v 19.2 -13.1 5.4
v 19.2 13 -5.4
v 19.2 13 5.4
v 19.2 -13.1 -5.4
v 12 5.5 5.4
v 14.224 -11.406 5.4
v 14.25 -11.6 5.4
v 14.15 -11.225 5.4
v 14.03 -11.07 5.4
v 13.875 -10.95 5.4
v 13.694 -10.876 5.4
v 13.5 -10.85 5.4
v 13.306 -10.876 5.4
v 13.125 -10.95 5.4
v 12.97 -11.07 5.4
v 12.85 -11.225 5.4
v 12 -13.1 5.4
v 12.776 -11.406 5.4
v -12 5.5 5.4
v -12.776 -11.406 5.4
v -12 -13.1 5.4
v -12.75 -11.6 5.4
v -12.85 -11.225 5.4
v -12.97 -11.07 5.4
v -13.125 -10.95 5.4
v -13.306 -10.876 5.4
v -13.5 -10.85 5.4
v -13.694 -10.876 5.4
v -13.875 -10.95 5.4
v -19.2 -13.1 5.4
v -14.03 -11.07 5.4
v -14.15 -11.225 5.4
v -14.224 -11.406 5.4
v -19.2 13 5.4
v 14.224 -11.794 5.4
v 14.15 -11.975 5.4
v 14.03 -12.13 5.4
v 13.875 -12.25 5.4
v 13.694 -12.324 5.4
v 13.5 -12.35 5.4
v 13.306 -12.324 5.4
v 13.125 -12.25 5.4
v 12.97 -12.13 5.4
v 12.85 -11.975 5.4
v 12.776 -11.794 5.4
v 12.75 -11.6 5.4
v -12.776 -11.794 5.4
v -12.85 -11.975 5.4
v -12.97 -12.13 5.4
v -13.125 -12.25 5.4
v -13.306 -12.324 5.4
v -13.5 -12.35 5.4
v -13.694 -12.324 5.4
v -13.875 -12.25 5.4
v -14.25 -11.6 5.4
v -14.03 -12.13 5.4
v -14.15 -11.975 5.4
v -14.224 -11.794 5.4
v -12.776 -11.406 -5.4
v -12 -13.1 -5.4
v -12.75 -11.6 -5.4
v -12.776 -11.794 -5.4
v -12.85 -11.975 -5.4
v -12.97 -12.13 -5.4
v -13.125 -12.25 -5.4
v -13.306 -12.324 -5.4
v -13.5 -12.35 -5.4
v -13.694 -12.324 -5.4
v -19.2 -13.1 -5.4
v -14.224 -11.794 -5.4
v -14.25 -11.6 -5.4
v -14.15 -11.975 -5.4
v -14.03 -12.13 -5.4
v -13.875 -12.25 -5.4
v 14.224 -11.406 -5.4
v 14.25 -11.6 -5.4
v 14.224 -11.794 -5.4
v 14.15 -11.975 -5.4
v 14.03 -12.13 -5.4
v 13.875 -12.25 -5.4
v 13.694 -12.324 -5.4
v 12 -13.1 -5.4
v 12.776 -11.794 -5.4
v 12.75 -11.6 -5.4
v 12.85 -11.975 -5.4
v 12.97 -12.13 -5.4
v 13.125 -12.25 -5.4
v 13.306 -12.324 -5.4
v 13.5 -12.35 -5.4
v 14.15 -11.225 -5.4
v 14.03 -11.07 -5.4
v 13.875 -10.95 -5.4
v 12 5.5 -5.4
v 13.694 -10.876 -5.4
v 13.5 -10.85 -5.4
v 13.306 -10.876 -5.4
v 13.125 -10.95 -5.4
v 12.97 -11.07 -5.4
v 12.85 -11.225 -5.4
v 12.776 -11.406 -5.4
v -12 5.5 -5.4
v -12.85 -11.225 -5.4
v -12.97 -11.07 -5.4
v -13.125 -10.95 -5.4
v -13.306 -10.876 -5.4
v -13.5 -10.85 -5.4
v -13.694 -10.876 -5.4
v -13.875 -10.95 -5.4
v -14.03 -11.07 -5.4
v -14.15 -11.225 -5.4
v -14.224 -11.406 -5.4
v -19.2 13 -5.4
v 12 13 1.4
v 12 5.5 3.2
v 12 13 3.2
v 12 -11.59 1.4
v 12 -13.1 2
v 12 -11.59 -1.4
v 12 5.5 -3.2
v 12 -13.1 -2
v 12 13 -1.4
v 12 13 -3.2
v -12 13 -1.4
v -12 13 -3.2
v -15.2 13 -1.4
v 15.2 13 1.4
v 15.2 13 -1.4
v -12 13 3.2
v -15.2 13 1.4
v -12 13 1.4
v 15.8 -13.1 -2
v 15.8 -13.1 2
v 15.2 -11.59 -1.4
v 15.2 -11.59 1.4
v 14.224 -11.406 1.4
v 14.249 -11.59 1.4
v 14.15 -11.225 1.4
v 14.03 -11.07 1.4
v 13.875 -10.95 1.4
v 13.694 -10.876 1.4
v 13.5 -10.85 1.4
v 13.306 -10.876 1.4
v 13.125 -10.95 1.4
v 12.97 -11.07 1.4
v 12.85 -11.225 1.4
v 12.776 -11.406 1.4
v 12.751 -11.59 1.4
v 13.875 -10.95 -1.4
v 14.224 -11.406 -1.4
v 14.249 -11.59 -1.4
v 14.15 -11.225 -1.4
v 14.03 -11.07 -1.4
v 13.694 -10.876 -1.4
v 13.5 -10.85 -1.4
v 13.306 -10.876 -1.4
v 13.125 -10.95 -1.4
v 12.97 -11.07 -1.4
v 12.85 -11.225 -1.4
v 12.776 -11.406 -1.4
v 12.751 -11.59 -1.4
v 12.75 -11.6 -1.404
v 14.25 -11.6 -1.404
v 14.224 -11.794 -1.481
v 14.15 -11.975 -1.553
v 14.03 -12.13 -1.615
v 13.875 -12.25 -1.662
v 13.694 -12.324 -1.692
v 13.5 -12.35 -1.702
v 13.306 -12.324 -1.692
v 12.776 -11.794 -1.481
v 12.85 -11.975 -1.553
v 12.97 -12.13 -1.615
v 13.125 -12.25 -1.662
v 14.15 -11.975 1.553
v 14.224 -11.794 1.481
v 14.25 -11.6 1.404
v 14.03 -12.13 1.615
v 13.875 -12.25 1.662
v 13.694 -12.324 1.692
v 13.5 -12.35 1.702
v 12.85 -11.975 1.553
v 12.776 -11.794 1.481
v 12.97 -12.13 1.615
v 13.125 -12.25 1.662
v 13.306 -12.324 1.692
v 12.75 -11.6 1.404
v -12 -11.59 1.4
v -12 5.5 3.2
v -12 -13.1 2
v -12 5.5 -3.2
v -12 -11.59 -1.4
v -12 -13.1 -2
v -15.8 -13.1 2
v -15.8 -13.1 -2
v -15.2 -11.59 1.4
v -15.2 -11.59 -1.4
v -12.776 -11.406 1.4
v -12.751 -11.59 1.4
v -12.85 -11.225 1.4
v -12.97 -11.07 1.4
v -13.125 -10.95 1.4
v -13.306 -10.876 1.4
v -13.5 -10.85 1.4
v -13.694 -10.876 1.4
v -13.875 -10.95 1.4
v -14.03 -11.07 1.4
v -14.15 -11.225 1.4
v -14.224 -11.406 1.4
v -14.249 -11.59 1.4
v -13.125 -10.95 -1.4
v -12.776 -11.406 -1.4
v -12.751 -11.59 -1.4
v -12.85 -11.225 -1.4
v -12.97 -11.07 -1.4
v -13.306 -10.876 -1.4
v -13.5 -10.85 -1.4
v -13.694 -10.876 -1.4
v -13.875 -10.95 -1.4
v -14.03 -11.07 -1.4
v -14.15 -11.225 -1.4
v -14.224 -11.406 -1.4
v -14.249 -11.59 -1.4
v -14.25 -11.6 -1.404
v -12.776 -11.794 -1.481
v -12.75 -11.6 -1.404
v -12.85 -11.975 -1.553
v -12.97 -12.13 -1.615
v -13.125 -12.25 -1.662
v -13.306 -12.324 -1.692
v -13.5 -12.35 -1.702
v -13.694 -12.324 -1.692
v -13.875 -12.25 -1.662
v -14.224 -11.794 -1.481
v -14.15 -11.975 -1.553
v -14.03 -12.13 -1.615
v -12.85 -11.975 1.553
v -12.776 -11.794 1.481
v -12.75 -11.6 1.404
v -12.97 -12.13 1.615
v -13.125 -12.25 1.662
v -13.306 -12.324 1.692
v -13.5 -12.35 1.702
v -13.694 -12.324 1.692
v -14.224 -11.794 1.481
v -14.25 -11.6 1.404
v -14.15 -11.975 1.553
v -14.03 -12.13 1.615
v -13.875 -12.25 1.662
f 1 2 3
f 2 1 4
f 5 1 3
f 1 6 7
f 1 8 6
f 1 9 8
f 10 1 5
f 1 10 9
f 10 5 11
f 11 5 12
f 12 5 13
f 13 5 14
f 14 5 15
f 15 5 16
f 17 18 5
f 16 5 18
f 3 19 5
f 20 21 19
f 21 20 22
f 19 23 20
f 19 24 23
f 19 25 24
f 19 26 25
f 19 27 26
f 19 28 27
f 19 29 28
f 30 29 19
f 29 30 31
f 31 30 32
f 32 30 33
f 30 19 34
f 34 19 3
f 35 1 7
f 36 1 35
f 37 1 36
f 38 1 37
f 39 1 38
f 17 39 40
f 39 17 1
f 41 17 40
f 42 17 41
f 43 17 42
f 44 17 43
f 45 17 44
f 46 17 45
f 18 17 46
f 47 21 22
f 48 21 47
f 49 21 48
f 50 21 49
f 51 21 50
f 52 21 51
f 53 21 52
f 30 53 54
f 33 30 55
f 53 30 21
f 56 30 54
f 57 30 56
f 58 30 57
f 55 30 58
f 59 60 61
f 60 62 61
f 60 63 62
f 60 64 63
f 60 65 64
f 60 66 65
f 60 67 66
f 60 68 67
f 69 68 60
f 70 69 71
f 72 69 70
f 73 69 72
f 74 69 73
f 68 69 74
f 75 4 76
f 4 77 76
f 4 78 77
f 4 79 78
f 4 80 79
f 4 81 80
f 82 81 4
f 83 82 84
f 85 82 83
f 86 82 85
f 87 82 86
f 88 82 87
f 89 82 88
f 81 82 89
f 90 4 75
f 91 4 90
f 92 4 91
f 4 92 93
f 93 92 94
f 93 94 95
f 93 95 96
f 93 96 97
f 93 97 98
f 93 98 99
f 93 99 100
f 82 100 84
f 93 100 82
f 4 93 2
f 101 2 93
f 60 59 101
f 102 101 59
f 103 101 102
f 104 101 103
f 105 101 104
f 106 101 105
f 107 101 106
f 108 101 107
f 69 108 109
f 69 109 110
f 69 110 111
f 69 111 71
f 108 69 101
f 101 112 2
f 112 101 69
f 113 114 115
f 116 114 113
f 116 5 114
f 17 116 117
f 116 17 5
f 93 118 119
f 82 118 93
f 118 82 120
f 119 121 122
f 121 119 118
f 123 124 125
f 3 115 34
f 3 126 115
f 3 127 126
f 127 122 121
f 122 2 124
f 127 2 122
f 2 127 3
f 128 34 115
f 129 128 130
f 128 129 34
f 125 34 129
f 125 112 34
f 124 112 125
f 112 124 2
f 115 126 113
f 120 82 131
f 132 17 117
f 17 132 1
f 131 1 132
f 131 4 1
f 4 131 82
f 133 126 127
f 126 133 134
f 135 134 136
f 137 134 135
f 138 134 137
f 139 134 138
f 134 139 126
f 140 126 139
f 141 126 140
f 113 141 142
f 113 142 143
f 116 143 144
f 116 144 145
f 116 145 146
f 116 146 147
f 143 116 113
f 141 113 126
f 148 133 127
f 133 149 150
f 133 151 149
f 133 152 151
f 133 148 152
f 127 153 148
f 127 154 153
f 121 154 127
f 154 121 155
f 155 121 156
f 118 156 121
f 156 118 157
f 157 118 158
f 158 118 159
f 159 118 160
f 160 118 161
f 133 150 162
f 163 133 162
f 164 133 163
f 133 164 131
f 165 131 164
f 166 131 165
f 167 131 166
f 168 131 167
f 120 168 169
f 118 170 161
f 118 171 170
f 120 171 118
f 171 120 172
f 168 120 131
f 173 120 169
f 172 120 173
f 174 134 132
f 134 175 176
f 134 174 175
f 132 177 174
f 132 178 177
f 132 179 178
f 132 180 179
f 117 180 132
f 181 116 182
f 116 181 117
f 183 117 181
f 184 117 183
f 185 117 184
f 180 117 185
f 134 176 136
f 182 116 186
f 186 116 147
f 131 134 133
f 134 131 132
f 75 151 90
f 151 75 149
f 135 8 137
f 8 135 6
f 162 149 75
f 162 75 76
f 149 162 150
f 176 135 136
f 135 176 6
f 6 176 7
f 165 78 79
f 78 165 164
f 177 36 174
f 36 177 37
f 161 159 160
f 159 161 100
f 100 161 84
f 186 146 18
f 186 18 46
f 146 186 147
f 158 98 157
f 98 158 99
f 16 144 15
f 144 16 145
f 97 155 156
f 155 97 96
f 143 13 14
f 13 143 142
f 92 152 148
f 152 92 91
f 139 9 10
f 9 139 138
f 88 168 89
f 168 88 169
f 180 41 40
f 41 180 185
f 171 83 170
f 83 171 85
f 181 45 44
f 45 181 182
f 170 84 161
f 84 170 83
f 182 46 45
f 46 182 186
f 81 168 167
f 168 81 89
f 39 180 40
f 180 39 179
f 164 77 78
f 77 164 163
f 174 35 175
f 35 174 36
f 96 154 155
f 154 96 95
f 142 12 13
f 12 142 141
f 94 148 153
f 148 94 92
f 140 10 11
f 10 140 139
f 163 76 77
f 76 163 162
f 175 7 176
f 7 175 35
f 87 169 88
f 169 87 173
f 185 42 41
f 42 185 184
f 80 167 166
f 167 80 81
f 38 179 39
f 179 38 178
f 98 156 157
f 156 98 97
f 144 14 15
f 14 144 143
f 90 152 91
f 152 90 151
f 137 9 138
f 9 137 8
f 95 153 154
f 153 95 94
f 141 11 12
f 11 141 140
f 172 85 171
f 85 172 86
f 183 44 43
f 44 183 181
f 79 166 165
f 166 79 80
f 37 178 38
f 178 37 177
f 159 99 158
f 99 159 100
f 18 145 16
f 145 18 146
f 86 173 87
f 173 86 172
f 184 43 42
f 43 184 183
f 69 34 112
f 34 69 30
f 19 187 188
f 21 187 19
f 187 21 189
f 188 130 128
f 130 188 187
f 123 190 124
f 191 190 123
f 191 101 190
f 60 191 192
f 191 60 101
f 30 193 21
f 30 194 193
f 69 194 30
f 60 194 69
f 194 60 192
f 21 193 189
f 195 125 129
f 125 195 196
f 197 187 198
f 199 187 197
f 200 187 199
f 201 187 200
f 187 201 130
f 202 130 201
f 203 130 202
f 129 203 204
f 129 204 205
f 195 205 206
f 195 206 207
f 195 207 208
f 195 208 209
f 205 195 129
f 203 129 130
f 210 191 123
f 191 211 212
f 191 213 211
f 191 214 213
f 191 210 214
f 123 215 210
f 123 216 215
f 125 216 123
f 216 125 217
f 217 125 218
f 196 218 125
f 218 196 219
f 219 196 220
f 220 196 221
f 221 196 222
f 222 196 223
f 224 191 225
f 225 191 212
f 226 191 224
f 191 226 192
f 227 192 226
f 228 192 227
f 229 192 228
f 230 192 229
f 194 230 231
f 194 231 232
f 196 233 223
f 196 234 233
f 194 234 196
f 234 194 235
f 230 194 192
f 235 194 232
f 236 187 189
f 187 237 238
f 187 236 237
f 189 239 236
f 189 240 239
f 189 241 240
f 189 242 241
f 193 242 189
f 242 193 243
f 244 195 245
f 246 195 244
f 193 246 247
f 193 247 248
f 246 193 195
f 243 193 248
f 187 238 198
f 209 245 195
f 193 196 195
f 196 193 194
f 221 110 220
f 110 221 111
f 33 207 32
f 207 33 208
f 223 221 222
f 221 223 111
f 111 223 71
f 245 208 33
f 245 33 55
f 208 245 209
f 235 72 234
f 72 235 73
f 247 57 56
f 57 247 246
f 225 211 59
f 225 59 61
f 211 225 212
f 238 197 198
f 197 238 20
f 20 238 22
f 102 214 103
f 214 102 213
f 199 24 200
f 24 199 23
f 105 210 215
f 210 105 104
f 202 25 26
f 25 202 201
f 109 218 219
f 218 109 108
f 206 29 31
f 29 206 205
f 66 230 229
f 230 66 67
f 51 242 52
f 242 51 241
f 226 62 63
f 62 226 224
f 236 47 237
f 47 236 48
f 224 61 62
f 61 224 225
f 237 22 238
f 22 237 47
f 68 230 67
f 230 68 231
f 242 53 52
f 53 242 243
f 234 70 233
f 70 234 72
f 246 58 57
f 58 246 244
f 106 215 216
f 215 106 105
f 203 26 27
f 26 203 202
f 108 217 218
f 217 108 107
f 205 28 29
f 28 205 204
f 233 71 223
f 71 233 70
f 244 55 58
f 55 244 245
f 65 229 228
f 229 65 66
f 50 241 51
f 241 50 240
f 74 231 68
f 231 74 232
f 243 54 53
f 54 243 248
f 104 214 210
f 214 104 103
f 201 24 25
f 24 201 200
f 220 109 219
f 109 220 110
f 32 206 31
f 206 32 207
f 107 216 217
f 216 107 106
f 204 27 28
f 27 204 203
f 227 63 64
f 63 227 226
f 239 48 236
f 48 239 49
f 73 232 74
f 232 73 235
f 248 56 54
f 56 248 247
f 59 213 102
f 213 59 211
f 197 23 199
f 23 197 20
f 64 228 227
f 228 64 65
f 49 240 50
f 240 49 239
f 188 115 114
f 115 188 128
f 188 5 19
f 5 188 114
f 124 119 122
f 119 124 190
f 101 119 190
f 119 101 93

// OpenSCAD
// Outer holder for the strain-gauge flexure plate
//
// One piece: a jaw on each outer arm — the fixed mounting points — joined by a
// pair of yokes that bridge over and under the plate. It is printed as part of the
// discant's housing [given]: its +y end grows out of the gauge pad on the back face
// (discant/gauge_link.scad), so it cannot slide on. The jaws are open channels
// through to the -y end instead, and the plate slides in from there, its +y edge
// first, until that edge lands on the pad.
//
// The yokes sit across the plate rather than beyond it, so nothing projects
// past the plate's +y edge, and they are held clear of its faces: the gap
// between them is the exit for the gauge leads, which leave in +y. In y they
// sit between the inner holder's front face and the plate's edge, the one
// stretch of plate that neither of them occupies.
//
// Two of them rather than one keeps the jaws tied together symmetrically —
// with only the upper yoke the lower halves hang off the outboard walls.
//
// ASSEMBLY ORDER: the plate goes in FIRST, then the inner holder onto it, from the
// same side. The plate passes between the yokes, which that holder, 8.8 mm tall
// where the gap is 4.8, cannot do. Then a dowel pin across each jaw, just beyond
// the arm's tip, keeps the plate from pulling out.
//
// Each jaw is a C in cross-section: plates above and below the arm, joined by
// the wall outboard of the plate. The pad sets the insertion depth.
//
// Coordinates as in inner_holder.scad: origin at the centre of the plate, material
// from z = -plate_t/2 to +plate_t/2.

/* [Flexure plate — from the STEP, do not edit; plate_bot the bought cell's] */
plate_t    = 2.5;    // plate thickness
plate_x    = 15;     // plate half width
plate_top  = 12.5;   // the plate's +y edge
plate_bot  = -10.8;  // the plate's -y edge, where the arms end: the bought cell's
                     //   [measured 2026-11-21; -12.5 in the STEP]
arm_inner  = 12;     // inner face of the outer arms

/* [What it has to clear] */
inner_x    = 11.5;   // outer face of inner_holder.scad — must not be touched
inner_front = 4.5;   // +y face of inner_holder.scad

/* [Holder] */
wall       = 4;      // material above, below and outboard of the plate
fit        = 0.3;    // clearance on the plate thickness, total (0.15 per face)
w_clear    = 0.2;    // clearance to the plate — same slide fit as holder.scad
clear      = 0.5;    // clearance to the inner holder
yoke_clear = 1.0;    // minimum gap from the yokes back to the inner holder.
                     // The yokes then fill whatever is left up to the plate
                     // edge, so they are as deep as the gap allows.
pin_d      = 1.5;    // dowel pin (ISO 2338, 1.5 x 10) across each jaw, past the arm's tip
pin_clear  = 0.05;   // tip to pin
pin_wall   = 0.75;   // jaw left beyond the pin
root       = 0.5;    // the +y end reaches this far into the pad, so the two are one solid

/* [Lead gap] */
cable_h    = 6.4;    // free height kept around the plate for the leads; the
                     // yoke starts above it. The bought cell's lead lies glued 1.5 proud of
                     // one face [measured 2026-11-21] where the column runs under the yokes:
                     // 1.95 each side of the plate leaves it 0.45, either way up (was 4.8)

/* [Lead-in] */
lead_in    = 1.5;    // flare where the arms enter the jaws, 0 disables it
lead_c     = 0.6;    // how much it is flared, per side

$fa = 2; $fs = 0.2;

z_in     = plate_t / 2 + fit / 2;            // pocket half height
z_out    = z_in + wall;                      // outer half height
x_jaw    = max(arm_inner, inner_x + clear);  // inner face of the jaws
x_pocket = plate_x + w_clear;                // outer face of the pocket
x_out    = x_pocket + wall;                  // outer face of the jaws
y_mouth  = plate_bot - w_clear;              // where the arm tips seat
pin_x    = (arm_inner + plate_x) / 2;        // in the middle of the arm
pin_y    = plate_bot - pin_clear - pin_d / 2;
y_back   = pin_y - pin_d / 2 - pin_wall;     // -y end of the part
y_front  = plate_top + root;                 // +y end, inside the pad
y_yoke   = inner_front + yoke_clear;         // -y face of the yokes
yoke     = y_front - y_yoke;                 // resulting yoke depth, root included
z_yoke   = cable_h / 2;                      // inner face of the yokes

echo(str("outer holder ", 2 * x_out, " x ", y_front - y_back, " x ", 2 * z_out, " mm"));
echo(str("two yokes at y = ", y_yoke, " .. ", y_front, " (flush with the plate), ",
         yoke, " mm deep, ", z_out - z_yoke, " mm thick, faces at z = +-", z_yoke));
echo(str("gap back to the inner holder: ", y_yoke - inner_front, " mm"));
echo(str("lead gap between them: ", 2 * z_yoke, " mm, ", z_yoke - (plate_t / 2),
         " mm clear of each plate face"));
echo(str("dowel pins d", pin_d, " at x = +-", pin_x, ", y = ", pin_y, ", ", pin_clear, " beyond the arm tips"));
echo(str("inner face at x = ", x_jaw, ", so ", x_jaw - inner_x,
         " mm clear of the inner holder"));
echo(str("plate clearances: ", w_clear, " mm per side, ", fit / 2,
         " mm per face, ", w_clear, " mm at the arm tips"));

// Flare at the -y opening, where the plate enters the jaw pockets, so a printed
// edge does not catch on the way in.
module mouth() {
    hull() {
        translate([x_jaw - 1, y_back + lead_in, -z_in])
            cube([x_pocket - x_jaw + 1, 0.01, 2 * z_in]);
        translate([x_jaw - 1, y_back - 0.01, -z_in - lead_c])
            cube([x_pocket - x_jaw + 1 + lead_c, 0.01, 2 * (z_in + lead_c)]);
    }
}

module jaw() {
    difference() {
        translate([x_jaw, y_back, -z_out])
            cube([x_out - x_jaw, y_front - y_back, 2 * z_out]);

        // channel the arm sits in, open inboard and at both ends
        translate([x_jaw - 1, y_back - 1, -z_in])
            cube([x_pocket - x_jaw + 1, y_front - y_back + 2, 2 * z_in]);

        if (lead_in > 0) mouth();
        translate([pin_x, pin_y, -z_out - 1]) cylinder(d = pin_d, h = 2 * z_out + 2);
    }
}

module outer_holder() {
    jaw();
    mirror([1, 0, 0]) jaw();

    // yokes over and under the plate, with the lead gap left between them
    for (s = [0, 1])
        mirror([0, 0, s])
            translate([-x_out, y_yoke, z_yoke])
                cube([2 * x_out, yoke, z_out - z_yoke]);
}

outer_holder();
